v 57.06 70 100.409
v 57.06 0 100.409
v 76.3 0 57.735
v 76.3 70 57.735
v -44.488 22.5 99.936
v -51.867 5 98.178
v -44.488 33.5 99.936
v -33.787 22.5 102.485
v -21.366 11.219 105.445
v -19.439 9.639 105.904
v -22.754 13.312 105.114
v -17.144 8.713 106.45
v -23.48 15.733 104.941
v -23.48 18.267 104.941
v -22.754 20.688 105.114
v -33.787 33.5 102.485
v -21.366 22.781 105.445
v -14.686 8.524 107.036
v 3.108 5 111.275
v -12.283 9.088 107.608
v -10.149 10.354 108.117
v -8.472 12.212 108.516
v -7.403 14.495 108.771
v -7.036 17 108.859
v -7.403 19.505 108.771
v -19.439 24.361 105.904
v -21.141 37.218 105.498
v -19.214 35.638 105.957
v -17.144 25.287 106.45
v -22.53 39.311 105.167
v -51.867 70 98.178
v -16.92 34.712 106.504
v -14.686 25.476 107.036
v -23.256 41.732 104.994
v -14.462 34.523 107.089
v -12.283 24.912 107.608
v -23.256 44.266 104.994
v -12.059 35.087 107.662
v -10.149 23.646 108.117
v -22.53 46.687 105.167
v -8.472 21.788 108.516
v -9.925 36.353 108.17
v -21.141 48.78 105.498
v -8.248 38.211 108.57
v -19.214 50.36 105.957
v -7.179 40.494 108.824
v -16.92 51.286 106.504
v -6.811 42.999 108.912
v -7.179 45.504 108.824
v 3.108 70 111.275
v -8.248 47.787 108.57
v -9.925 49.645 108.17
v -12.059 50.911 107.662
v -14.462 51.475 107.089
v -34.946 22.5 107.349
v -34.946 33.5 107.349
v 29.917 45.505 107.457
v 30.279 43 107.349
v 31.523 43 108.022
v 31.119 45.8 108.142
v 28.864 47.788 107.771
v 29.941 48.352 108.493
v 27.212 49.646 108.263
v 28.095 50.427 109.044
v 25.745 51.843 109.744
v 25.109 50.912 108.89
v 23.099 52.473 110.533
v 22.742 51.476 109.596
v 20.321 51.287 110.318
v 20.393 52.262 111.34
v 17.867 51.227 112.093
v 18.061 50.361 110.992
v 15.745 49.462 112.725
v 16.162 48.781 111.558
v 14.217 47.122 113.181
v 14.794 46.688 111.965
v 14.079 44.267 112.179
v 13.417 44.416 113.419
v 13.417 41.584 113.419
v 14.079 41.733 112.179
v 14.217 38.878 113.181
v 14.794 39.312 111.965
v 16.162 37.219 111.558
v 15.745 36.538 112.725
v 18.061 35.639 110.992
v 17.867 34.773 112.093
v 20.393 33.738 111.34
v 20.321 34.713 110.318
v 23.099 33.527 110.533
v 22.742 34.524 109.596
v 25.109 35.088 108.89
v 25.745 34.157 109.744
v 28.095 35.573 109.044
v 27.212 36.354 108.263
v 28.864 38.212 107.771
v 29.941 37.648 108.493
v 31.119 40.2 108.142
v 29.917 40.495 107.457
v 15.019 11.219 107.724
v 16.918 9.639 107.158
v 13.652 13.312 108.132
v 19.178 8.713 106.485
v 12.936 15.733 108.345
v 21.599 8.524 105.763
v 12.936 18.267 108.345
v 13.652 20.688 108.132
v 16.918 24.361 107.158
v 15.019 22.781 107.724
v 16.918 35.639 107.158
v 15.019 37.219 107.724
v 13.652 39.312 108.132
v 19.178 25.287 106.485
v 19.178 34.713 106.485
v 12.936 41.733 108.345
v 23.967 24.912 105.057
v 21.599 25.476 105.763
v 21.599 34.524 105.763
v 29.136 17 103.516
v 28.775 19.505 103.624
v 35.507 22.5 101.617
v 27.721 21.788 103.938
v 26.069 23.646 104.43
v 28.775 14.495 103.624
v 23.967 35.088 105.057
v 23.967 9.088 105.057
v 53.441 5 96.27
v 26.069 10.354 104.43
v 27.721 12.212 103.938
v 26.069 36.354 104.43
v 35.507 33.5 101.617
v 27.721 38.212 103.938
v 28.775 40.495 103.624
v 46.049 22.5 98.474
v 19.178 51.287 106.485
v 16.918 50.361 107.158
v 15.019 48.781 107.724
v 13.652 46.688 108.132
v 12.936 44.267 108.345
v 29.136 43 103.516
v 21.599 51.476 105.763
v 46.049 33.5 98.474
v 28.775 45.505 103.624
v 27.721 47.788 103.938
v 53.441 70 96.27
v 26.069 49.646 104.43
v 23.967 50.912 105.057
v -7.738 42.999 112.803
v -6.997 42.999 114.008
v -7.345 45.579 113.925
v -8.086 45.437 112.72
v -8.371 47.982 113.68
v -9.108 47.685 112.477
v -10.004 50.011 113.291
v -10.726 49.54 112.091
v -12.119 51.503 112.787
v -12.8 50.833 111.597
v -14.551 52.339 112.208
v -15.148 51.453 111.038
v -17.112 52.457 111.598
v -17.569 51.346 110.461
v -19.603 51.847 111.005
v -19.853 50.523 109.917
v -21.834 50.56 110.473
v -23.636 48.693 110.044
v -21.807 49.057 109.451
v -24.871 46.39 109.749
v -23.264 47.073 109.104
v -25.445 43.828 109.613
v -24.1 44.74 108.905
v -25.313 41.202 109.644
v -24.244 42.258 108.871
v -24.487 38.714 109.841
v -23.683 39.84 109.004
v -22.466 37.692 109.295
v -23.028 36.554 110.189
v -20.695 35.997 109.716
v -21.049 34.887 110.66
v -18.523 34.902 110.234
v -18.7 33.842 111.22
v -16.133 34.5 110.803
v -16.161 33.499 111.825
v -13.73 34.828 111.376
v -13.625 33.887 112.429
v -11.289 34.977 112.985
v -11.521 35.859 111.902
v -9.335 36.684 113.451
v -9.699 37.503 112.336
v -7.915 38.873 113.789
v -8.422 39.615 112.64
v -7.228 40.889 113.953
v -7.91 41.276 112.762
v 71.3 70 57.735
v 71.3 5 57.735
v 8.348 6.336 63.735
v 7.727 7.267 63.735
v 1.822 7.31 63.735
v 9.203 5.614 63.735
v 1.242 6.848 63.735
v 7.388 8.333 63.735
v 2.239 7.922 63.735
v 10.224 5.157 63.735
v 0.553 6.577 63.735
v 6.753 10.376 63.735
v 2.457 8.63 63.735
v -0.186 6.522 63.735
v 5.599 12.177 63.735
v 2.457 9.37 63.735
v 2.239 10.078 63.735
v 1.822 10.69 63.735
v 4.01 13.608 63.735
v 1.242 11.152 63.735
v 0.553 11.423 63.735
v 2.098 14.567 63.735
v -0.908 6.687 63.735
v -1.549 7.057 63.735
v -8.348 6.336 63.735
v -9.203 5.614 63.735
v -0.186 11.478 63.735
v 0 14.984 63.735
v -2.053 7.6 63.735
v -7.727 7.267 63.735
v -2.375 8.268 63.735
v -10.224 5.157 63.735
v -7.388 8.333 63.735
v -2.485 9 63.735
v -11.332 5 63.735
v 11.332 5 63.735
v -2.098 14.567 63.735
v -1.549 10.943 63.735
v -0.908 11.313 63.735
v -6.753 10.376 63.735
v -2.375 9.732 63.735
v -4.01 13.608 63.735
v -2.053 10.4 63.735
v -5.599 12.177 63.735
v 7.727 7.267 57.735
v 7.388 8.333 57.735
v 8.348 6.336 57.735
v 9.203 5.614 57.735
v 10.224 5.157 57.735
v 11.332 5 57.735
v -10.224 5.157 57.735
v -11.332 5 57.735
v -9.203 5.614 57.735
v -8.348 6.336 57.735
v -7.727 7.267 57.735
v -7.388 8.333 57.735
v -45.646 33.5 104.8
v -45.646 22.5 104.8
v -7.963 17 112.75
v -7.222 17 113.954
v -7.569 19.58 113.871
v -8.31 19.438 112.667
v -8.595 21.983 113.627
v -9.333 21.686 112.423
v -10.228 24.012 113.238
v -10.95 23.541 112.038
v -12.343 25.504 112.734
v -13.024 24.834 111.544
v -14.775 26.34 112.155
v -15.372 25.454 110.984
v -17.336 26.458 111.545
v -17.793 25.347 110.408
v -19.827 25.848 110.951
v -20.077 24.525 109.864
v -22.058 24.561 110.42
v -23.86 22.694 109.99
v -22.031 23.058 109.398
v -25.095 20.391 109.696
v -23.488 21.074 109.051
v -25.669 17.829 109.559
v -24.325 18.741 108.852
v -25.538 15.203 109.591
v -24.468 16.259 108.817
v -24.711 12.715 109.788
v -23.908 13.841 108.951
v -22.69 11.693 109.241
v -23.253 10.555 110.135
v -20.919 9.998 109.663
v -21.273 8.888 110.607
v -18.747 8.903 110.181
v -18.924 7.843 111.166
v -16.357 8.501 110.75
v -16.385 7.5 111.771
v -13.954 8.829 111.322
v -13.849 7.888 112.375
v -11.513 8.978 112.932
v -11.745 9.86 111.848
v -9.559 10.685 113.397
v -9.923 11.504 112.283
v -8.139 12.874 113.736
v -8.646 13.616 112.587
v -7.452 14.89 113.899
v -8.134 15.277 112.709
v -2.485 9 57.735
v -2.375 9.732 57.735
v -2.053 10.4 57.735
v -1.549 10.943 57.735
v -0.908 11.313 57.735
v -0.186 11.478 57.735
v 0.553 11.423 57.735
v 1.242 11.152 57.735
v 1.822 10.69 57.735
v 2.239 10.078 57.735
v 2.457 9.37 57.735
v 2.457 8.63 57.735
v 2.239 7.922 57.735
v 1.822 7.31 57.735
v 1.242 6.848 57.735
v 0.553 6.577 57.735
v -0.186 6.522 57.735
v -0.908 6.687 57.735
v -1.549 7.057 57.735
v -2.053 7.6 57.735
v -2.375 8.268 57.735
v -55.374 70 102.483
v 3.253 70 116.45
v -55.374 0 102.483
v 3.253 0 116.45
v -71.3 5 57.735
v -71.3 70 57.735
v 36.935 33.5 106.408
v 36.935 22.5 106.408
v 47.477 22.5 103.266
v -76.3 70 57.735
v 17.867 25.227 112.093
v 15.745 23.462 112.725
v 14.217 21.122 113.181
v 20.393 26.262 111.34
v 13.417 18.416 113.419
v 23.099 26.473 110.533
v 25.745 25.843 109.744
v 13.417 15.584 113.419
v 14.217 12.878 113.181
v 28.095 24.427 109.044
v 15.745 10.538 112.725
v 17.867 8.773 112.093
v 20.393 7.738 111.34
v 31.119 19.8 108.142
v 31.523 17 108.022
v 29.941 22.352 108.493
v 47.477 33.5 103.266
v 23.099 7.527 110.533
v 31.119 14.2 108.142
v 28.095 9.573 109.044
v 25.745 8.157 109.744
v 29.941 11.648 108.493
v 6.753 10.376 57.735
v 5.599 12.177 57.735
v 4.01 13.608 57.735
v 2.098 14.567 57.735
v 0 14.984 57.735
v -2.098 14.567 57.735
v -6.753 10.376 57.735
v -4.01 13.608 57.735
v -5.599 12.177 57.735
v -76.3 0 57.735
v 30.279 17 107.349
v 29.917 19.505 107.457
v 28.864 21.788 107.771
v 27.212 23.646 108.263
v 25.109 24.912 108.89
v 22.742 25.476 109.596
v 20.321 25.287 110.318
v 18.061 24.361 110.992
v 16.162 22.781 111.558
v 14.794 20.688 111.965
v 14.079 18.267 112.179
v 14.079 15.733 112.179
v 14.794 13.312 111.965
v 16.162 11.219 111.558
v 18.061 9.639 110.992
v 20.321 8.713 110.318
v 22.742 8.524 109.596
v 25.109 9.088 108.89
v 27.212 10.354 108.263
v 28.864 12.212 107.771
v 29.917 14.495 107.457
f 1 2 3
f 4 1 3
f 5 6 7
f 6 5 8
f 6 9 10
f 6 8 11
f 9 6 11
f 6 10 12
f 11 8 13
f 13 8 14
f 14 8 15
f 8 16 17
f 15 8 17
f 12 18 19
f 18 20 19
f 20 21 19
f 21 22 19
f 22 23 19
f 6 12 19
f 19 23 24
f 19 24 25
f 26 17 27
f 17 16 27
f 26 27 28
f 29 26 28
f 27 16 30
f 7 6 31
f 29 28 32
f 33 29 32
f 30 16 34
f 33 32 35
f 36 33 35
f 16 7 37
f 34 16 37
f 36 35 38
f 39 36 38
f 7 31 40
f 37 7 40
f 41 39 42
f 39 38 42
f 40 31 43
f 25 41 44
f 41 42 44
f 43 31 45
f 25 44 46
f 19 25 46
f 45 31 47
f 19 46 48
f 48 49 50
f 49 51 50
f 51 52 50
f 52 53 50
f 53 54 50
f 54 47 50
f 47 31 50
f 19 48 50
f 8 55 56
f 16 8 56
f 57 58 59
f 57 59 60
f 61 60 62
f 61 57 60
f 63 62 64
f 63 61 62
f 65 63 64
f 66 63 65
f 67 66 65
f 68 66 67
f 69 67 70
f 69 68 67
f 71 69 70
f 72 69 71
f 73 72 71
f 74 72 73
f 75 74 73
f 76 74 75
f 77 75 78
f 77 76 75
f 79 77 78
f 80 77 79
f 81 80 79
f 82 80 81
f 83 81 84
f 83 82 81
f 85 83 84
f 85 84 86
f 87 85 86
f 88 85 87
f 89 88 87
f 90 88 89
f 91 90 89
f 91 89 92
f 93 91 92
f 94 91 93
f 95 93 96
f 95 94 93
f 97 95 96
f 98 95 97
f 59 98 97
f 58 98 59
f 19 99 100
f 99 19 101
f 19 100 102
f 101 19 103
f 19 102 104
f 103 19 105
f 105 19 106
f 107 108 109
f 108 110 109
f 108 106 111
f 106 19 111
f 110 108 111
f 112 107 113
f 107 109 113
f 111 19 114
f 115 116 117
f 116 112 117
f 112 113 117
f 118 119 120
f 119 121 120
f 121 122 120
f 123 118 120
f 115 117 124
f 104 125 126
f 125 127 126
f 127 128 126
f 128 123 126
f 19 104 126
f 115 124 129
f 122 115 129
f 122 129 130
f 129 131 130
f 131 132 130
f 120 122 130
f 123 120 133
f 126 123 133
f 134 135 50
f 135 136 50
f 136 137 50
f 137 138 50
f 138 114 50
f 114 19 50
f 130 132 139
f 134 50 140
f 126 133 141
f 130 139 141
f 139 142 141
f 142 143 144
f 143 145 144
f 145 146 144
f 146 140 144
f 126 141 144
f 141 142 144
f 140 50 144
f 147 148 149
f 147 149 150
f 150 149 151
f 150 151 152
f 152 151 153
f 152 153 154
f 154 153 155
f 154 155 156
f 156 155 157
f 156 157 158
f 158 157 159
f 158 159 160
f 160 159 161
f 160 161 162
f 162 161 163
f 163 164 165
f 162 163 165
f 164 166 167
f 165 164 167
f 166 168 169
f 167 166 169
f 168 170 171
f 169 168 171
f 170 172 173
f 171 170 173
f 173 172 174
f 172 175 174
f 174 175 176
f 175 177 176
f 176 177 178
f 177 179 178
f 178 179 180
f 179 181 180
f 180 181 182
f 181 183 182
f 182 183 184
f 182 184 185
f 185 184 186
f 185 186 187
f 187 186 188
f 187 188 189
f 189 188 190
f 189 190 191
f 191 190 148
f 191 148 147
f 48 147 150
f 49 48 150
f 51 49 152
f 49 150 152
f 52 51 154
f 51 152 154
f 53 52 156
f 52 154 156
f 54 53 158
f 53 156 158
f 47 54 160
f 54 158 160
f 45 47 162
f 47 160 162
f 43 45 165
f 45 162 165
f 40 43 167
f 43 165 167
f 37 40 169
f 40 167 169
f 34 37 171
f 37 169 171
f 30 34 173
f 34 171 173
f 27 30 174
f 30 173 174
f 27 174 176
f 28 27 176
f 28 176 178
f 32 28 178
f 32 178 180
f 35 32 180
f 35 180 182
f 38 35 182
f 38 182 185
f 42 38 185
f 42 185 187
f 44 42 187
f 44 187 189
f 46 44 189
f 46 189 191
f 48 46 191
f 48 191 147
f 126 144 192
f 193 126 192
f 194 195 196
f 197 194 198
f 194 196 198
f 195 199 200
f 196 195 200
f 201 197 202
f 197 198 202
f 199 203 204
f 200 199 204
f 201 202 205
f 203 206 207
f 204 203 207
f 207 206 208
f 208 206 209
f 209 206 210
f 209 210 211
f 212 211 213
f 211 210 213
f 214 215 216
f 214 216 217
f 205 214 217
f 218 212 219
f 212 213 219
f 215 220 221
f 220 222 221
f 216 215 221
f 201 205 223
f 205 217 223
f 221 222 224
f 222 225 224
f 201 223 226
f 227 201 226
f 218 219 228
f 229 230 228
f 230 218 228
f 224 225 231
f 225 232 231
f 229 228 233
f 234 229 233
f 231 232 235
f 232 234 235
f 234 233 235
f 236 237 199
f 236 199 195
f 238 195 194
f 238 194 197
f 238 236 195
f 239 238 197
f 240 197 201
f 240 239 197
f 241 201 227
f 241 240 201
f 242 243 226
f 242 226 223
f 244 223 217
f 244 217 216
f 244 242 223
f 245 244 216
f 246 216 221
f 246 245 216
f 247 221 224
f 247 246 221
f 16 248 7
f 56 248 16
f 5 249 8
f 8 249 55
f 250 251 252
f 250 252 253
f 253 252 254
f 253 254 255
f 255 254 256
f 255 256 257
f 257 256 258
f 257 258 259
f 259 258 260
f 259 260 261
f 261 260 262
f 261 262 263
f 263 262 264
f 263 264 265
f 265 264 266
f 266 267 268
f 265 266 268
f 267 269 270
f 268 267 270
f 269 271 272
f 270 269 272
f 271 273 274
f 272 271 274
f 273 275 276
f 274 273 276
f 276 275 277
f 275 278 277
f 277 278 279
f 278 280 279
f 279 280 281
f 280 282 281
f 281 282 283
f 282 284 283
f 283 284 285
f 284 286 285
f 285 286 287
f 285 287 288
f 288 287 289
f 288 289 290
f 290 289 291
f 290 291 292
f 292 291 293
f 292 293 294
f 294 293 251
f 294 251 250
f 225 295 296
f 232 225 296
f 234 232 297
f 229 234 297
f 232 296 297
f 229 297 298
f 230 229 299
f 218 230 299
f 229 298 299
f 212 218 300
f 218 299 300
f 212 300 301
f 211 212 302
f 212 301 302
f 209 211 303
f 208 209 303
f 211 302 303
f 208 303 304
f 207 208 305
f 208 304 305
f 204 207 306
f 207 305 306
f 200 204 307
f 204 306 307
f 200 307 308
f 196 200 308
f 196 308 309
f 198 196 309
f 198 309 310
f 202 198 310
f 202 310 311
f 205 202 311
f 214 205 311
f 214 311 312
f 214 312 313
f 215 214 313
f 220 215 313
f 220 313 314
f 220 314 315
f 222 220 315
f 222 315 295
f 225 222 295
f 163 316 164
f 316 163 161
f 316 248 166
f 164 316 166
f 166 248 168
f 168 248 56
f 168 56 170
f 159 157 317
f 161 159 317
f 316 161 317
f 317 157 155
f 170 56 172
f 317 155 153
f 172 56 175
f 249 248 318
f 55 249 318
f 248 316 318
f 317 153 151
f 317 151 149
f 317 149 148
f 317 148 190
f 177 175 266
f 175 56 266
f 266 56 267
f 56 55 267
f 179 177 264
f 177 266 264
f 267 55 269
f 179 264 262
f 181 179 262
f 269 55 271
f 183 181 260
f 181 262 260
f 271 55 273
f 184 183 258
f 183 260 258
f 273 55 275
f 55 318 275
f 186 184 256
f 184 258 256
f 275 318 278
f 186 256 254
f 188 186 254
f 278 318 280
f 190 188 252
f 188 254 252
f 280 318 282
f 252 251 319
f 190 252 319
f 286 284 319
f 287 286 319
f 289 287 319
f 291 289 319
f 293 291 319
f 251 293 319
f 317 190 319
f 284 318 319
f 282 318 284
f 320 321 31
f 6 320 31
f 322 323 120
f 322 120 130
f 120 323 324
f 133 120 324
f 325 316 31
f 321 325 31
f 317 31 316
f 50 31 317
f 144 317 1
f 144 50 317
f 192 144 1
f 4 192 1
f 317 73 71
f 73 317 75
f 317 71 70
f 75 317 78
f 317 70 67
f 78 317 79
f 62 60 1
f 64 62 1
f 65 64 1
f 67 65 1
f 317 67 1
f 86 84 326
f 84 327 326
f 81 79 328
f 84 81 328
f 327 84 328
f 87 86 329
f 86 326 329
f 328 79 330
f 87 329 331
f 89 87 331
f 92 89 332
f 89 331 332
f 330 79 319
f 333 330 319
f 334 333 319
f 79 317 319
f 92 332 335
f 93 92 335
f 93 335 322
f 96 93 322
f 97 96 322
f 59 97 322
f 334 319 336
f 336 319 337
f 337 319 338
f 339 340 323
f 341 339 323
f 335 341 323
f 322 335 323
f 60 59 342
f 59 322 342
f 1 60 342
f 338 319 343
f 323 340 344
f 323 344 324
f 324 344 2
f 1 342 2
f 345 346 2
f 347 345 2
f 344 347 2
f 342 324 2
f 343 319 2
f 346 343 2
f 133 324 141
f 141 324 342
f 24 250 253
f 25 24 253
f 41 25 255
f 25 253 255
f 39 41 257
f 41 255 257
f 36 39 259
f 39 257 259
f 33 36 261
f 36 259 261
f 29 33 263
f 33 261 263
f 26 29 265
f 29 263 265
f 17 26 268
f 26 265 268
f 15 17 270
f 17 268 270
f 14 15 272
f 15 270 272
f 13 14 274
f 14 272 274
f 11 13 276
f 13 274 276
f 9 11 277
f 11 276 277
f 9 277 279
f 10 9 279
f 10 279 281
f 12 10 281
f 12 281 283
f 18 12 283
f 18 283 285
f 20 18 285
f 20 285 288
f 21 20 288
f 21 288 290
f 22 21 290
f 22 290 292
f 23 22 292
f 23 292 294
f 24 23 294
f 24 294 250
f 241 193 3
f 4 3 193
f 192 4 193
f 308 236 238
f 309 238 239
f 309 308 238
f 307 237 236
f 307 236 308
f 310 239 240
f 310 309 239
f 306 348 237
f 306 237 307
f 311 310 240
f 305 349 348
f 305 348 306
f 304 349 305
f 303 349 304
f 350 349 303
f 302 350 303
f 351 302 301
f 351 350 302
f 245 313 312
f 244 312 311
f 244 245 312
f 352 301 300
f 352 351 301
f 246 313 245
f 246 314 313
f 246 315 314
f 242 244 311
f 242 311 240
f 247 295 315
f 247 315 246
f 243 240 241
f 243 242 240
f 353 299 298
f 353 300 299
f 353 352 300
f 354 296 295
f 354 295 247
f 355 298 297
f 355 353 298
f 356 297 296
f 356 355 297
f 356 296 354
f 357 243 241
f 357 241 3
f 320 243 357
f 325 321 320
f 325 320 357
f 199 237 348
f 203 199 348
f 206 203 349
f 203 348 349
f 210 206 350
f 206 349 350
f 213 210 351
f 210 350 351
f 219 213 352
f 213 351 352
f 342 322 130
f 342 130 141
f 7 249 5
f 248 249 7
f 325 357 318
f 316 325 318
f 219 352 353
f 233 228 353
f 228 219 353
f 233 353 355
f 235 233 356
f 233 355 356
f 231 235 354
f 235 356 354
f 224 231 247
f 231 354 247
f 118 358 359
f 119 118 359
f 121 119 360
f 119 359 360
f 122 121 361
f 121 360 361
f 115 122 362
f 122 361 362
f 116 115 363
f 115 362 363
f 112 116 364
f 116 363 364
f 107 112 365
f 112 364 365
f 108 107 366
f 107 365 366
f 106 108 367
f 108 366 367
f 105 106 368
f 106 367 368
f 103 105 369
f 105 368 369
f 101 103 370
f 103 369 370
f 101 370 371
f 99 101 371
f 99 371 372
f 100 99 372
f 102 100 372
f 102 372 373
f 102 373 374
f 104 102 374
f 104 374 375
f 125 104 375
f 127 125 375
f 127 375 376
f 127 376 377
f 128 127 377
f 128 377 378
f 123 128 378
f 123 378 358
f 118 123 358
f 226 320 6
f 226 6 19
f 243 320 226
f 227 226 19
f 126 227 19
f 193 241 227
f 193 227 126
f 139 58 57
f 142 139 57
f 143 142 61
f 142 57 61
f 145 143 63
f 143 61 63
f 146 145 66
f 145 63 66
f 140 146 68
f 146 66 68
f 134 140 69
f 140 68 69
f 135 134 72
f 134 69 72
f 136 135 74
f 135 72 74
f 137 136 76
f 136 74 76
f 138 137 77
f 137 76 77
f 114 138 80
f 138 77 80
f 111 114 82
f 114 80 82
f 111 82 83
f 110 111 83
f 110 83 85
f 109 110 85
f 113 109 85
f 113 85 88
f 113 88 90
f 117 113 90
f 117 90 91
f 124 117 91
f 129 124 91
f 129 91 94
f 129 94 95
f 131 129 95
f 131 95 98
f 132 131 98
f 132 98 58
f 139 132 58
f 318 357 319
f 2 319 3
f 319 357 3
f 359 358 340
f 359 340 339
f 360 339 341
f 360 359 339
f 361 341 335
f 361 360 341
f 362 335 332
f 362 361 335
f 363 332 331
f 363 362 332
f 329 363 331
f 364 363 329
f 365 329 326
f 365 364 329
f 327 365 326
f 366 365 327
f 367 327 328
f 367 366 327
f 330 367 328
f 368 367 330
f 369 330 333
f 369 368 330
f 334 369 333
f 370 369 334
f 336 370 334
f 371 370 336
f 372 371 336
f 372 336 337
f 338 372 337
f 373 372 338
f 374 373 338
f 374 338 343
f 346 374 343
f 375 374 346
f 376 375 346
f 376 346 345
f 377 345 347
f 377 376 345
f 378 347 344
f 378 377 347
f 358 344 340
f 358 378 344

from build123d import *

# Parameters (mm, degrees)
BOSS_EXTRUDE1_DEPTH = 70
CUT_EXTRUDE1_DEPTH  = 65
SKETCH5_R           = 8.5
CUT_EXTRUDE2_DEPTH  = 10
SKETCH6_R           = 8.5
CUT_EXTRUDE3_DEPTH  = 10
CHAMFER2_SIZE       = 1
SKETCH7_W           = 11
SKETCH7_H           = 11
CUT_EXTRUDE4_DEPTH  = 10
SKETCH8_W           = 11
SKETCH8_H           = 11
CUT_EXTRUDE5_DEPTH  = 10
SKETCH9_W           = 15
SKETCH9_H           = 10
BOSS_EXTRUDE2_DEPTH = 6
FILLET1_R           = 8
FILLET2_R           = 4
SKETCH11_R          = 2.484902638
CUT_EXTRUDE7_DEPTH  = 10


with BuildPart() as part:
    # Sketch1 → Boss-Extrude1 (new body)
    with BuildSketch(Plane(origin=(0, 0, 0), x_dir=(1, 0, 0), z_dir=(0, 1, 0))):
        Polygon((-55.37403033, -102.482648945), (3.252686078, -116.449526131), (57.060212297, -100.408827863), (76.3, -57.735026919), (-76.3, -57.735026919), align=None)
    extrude(amount=BOSS_EXTRUDE1_DEPTH)

    # Sketch4 → Cut-Extrude1 (cut)
    with BuildSketch(Plane(origin=(0, 70, 0), x_dir=(1, 0, 0), z_dir=(0, 1, 0))):
        Polygon((-51.867290581, -98.178143042), (3.108154981, -111.275163368), (53.44146669, -96.270172009), (71.3, -57.735026919), (-71.3, -57.735026919), align=None)
    extrude(amount=-CUT_EXTRUDE1_DEPTH, mode=Mode.SUBTRACT)

    # Sketch5 → Cut-Extrude2 (cut)
    with BuildSketch(Plane(origin=(-26.077584107, 0, 109.462058529), x_dir=(0.9727757912880333, 0, 0.23174826835154788), z_dir=(-0.23174826835154788, 0, 0.9727757912880333))):
        with Locations((10.114141871, 42.998978407)):
            Circle(SKETCH5_R)
        with Locations((9.883660258, 17)):
            Circle(SKETCH5_R)
    extrude(amount=-CUT_EXTRUDE2_DEPTH, mode=Mode.SUBTRACT)

    # Sketch6 → Cut-Extrude3 (cut)
    with BuildSketch(Plane(origin=(32.147178959, 0, 107.83571549), x_dir=(0.9583226816177197, 0, -0.28568800796852273), z_dir=(0.2856880079685227, 0, 0.9583226816177196))):
        with Locations((-10.151110305, 17)):
            Circle(SKETCH6_R)
        with Locations((-10.151110305, 43)):
            Circle(SKETCH6_R)
    extrude(amount=-CUT_EXTRUDE3_DEPTH, mode=Mode.SUBTRACT)

    # Chamfer2
    chamfer2_edges = [part.edges().sort_by_distance(p)[0] for p in [
        (-24.507385971, 42.998978407, 109.836133113),
        (-24.731592905, 17, 109.782719398),
        (14.273396917, 17, 113.164114039),
        (14.273396917, 43, 113.164114039),
    ]]
    chamfer(chamfer2_edges, length=CHAMFER2_SIZE)

    # Sketch7 → Cut-Extrude4 (cut)
    with BuildSketch(Plane(origin=(-26.077584107, 0, 109.462058529), x_dir=(0.9727757912880333, 0, 0.23174826835154788), z_dir=(-0.23174826835154788, 0, 0.9727757912880333))):
        with Locations((-14.616339742, 28)):
            Rectangle(SKETCH7_W, SKETCH7_H)
    extrude(amount=-CUT_EXTRUDE4_DEPTH, mode=Mode.SUBTRACT)

    # Sketch8 → Cut-Extrude5 (cut)
    with BuildSketch(Plane(origin=(32.147178959, 0, 107.83571549), x_dir=(0.9583226816177197, 0, -0.28568800796852273), z_dir=(0.2856880079685227, 0, 0.9583226816177196))):
        with Locations((10.496497648, 28)):
            Rectangle(SKETCH8_W, SKETCH8_H)
    extrude(amount=-CUT_EXTRUDE5_DEPTH, mode=Mode.SUBTRACT)

    # Sketch9 → Boss-Extrude2 (add)
    with BuildSketch(Plane(origin=(0, 0, 57.735026919), x_dir=(-1, 0, 0), z_dir=(0, 0, -1))):
        with Locations((0, 10)):
            Rectangle(SKETCH9_W, SKETCH9_H)
    extrude(amount=-BOSS_EXTRUDE2_DEPTH)

    # Fillet1
    # the kernel refuses this fillet: 8 mm, written as the material it takes off along each edge
    with BuildSketch(Plane(origin=(-7.5, 15, 37.735026919), x_dir=(0, -1, 0), z_dir=(0, 0, 1))) as fillet1_piece_1:
        with BuildLine():
            CenterArc((FILLET1_R, FILLET1_R), FILLET1_R, 180, 90)
            Line((0, FILLET1_R), (0, 0))
            Line((0, 0), (FILLET1_R, 0))
        make_face()
    extrude(amount=46, mode=Mode.SUBTRACT)
    with BuildSketch(Plane(origin=(7.5, 15, 37.735026919), x_dir=(0, -1, 0), z_dir=(0, 0, 1))) as fillet1_piece_2:
        with BuildLine():
            CenterArc((FILLET1_R, -FILLET1_R), FILLET1_R, 90, 90)
            Line((0, -FILLET1_R), (0, 0))
            Line((0, 0), (FILLET1_R, 0))
        make_face()
    extrude(amount=46, mode=Mode.SUBTRACT)

    # Fillet2
    # the kernel refuses this fillet: 4 mm, written as the material it adds along each edge
    with BuildSketch(Plane(origin=(-7.5, 5, 57.735026919), x_dir=(-1, 0, 0), z_dir=(0, 0, 1))) as fillet2_piece_1:
        with BuildLine():
            CenterArc((3.832159566, -4), FILLET2_R, 90, 80.405931773)
            Line((-0.111893623, -3.333333333), (-0.506298941, -3.266666667))
            ThreePointArc((-0.506298941, -3.266666667), (-0.4, -2), (-0.4, 0))
            Line((-0.4, 0), (0, 0.4))
            Line((0, 0.4), (3.832159566, 0.4))
            Line((3.832159566, 0.4), (3.832159566, 0))
        make_face()
    extrude(amount=6)
    with BuildSketch(Plane(origin=(7.5, 5, 57.735026919), x_dir=(1, 0, 0), z_dir=(0, 0, 1))) as fillet2_piece_2:
        with BuildLine():
            CenterArc((3.832159566, 4), FILLET2_R, 189.594068227, 80.405931773)
            Line((-0.111893623, 3.333333333), (-0.506298941, 3.266666667))
            ThreePointArc((-0.506298941, 3.266666667), (-0.4, 2), (-0.4, 0))
            Line((-0.4, 0), (0, -0.4))
            Line((0, -0.4), (3.832159566, -0.4))
            Line((3.832159566, -0.4), (3.832159566, 0))
        make_face()
    extrude(amount=6)

    # Sketch11 → Cut-Extrude7 (cut)
    with BuildSketch(Plane(origin=(0, 0, 57.735026919), x_dir=(-1, 0, 0), z_dir=(0, 0, -1))):
        with Locations((0, 9)):
            Circle(SKETCH11_R)
    extrude(amount=-CUT_EXTRUDE7_DEPTH, mode=Mode.SUBTRACT)


solid = part.part
